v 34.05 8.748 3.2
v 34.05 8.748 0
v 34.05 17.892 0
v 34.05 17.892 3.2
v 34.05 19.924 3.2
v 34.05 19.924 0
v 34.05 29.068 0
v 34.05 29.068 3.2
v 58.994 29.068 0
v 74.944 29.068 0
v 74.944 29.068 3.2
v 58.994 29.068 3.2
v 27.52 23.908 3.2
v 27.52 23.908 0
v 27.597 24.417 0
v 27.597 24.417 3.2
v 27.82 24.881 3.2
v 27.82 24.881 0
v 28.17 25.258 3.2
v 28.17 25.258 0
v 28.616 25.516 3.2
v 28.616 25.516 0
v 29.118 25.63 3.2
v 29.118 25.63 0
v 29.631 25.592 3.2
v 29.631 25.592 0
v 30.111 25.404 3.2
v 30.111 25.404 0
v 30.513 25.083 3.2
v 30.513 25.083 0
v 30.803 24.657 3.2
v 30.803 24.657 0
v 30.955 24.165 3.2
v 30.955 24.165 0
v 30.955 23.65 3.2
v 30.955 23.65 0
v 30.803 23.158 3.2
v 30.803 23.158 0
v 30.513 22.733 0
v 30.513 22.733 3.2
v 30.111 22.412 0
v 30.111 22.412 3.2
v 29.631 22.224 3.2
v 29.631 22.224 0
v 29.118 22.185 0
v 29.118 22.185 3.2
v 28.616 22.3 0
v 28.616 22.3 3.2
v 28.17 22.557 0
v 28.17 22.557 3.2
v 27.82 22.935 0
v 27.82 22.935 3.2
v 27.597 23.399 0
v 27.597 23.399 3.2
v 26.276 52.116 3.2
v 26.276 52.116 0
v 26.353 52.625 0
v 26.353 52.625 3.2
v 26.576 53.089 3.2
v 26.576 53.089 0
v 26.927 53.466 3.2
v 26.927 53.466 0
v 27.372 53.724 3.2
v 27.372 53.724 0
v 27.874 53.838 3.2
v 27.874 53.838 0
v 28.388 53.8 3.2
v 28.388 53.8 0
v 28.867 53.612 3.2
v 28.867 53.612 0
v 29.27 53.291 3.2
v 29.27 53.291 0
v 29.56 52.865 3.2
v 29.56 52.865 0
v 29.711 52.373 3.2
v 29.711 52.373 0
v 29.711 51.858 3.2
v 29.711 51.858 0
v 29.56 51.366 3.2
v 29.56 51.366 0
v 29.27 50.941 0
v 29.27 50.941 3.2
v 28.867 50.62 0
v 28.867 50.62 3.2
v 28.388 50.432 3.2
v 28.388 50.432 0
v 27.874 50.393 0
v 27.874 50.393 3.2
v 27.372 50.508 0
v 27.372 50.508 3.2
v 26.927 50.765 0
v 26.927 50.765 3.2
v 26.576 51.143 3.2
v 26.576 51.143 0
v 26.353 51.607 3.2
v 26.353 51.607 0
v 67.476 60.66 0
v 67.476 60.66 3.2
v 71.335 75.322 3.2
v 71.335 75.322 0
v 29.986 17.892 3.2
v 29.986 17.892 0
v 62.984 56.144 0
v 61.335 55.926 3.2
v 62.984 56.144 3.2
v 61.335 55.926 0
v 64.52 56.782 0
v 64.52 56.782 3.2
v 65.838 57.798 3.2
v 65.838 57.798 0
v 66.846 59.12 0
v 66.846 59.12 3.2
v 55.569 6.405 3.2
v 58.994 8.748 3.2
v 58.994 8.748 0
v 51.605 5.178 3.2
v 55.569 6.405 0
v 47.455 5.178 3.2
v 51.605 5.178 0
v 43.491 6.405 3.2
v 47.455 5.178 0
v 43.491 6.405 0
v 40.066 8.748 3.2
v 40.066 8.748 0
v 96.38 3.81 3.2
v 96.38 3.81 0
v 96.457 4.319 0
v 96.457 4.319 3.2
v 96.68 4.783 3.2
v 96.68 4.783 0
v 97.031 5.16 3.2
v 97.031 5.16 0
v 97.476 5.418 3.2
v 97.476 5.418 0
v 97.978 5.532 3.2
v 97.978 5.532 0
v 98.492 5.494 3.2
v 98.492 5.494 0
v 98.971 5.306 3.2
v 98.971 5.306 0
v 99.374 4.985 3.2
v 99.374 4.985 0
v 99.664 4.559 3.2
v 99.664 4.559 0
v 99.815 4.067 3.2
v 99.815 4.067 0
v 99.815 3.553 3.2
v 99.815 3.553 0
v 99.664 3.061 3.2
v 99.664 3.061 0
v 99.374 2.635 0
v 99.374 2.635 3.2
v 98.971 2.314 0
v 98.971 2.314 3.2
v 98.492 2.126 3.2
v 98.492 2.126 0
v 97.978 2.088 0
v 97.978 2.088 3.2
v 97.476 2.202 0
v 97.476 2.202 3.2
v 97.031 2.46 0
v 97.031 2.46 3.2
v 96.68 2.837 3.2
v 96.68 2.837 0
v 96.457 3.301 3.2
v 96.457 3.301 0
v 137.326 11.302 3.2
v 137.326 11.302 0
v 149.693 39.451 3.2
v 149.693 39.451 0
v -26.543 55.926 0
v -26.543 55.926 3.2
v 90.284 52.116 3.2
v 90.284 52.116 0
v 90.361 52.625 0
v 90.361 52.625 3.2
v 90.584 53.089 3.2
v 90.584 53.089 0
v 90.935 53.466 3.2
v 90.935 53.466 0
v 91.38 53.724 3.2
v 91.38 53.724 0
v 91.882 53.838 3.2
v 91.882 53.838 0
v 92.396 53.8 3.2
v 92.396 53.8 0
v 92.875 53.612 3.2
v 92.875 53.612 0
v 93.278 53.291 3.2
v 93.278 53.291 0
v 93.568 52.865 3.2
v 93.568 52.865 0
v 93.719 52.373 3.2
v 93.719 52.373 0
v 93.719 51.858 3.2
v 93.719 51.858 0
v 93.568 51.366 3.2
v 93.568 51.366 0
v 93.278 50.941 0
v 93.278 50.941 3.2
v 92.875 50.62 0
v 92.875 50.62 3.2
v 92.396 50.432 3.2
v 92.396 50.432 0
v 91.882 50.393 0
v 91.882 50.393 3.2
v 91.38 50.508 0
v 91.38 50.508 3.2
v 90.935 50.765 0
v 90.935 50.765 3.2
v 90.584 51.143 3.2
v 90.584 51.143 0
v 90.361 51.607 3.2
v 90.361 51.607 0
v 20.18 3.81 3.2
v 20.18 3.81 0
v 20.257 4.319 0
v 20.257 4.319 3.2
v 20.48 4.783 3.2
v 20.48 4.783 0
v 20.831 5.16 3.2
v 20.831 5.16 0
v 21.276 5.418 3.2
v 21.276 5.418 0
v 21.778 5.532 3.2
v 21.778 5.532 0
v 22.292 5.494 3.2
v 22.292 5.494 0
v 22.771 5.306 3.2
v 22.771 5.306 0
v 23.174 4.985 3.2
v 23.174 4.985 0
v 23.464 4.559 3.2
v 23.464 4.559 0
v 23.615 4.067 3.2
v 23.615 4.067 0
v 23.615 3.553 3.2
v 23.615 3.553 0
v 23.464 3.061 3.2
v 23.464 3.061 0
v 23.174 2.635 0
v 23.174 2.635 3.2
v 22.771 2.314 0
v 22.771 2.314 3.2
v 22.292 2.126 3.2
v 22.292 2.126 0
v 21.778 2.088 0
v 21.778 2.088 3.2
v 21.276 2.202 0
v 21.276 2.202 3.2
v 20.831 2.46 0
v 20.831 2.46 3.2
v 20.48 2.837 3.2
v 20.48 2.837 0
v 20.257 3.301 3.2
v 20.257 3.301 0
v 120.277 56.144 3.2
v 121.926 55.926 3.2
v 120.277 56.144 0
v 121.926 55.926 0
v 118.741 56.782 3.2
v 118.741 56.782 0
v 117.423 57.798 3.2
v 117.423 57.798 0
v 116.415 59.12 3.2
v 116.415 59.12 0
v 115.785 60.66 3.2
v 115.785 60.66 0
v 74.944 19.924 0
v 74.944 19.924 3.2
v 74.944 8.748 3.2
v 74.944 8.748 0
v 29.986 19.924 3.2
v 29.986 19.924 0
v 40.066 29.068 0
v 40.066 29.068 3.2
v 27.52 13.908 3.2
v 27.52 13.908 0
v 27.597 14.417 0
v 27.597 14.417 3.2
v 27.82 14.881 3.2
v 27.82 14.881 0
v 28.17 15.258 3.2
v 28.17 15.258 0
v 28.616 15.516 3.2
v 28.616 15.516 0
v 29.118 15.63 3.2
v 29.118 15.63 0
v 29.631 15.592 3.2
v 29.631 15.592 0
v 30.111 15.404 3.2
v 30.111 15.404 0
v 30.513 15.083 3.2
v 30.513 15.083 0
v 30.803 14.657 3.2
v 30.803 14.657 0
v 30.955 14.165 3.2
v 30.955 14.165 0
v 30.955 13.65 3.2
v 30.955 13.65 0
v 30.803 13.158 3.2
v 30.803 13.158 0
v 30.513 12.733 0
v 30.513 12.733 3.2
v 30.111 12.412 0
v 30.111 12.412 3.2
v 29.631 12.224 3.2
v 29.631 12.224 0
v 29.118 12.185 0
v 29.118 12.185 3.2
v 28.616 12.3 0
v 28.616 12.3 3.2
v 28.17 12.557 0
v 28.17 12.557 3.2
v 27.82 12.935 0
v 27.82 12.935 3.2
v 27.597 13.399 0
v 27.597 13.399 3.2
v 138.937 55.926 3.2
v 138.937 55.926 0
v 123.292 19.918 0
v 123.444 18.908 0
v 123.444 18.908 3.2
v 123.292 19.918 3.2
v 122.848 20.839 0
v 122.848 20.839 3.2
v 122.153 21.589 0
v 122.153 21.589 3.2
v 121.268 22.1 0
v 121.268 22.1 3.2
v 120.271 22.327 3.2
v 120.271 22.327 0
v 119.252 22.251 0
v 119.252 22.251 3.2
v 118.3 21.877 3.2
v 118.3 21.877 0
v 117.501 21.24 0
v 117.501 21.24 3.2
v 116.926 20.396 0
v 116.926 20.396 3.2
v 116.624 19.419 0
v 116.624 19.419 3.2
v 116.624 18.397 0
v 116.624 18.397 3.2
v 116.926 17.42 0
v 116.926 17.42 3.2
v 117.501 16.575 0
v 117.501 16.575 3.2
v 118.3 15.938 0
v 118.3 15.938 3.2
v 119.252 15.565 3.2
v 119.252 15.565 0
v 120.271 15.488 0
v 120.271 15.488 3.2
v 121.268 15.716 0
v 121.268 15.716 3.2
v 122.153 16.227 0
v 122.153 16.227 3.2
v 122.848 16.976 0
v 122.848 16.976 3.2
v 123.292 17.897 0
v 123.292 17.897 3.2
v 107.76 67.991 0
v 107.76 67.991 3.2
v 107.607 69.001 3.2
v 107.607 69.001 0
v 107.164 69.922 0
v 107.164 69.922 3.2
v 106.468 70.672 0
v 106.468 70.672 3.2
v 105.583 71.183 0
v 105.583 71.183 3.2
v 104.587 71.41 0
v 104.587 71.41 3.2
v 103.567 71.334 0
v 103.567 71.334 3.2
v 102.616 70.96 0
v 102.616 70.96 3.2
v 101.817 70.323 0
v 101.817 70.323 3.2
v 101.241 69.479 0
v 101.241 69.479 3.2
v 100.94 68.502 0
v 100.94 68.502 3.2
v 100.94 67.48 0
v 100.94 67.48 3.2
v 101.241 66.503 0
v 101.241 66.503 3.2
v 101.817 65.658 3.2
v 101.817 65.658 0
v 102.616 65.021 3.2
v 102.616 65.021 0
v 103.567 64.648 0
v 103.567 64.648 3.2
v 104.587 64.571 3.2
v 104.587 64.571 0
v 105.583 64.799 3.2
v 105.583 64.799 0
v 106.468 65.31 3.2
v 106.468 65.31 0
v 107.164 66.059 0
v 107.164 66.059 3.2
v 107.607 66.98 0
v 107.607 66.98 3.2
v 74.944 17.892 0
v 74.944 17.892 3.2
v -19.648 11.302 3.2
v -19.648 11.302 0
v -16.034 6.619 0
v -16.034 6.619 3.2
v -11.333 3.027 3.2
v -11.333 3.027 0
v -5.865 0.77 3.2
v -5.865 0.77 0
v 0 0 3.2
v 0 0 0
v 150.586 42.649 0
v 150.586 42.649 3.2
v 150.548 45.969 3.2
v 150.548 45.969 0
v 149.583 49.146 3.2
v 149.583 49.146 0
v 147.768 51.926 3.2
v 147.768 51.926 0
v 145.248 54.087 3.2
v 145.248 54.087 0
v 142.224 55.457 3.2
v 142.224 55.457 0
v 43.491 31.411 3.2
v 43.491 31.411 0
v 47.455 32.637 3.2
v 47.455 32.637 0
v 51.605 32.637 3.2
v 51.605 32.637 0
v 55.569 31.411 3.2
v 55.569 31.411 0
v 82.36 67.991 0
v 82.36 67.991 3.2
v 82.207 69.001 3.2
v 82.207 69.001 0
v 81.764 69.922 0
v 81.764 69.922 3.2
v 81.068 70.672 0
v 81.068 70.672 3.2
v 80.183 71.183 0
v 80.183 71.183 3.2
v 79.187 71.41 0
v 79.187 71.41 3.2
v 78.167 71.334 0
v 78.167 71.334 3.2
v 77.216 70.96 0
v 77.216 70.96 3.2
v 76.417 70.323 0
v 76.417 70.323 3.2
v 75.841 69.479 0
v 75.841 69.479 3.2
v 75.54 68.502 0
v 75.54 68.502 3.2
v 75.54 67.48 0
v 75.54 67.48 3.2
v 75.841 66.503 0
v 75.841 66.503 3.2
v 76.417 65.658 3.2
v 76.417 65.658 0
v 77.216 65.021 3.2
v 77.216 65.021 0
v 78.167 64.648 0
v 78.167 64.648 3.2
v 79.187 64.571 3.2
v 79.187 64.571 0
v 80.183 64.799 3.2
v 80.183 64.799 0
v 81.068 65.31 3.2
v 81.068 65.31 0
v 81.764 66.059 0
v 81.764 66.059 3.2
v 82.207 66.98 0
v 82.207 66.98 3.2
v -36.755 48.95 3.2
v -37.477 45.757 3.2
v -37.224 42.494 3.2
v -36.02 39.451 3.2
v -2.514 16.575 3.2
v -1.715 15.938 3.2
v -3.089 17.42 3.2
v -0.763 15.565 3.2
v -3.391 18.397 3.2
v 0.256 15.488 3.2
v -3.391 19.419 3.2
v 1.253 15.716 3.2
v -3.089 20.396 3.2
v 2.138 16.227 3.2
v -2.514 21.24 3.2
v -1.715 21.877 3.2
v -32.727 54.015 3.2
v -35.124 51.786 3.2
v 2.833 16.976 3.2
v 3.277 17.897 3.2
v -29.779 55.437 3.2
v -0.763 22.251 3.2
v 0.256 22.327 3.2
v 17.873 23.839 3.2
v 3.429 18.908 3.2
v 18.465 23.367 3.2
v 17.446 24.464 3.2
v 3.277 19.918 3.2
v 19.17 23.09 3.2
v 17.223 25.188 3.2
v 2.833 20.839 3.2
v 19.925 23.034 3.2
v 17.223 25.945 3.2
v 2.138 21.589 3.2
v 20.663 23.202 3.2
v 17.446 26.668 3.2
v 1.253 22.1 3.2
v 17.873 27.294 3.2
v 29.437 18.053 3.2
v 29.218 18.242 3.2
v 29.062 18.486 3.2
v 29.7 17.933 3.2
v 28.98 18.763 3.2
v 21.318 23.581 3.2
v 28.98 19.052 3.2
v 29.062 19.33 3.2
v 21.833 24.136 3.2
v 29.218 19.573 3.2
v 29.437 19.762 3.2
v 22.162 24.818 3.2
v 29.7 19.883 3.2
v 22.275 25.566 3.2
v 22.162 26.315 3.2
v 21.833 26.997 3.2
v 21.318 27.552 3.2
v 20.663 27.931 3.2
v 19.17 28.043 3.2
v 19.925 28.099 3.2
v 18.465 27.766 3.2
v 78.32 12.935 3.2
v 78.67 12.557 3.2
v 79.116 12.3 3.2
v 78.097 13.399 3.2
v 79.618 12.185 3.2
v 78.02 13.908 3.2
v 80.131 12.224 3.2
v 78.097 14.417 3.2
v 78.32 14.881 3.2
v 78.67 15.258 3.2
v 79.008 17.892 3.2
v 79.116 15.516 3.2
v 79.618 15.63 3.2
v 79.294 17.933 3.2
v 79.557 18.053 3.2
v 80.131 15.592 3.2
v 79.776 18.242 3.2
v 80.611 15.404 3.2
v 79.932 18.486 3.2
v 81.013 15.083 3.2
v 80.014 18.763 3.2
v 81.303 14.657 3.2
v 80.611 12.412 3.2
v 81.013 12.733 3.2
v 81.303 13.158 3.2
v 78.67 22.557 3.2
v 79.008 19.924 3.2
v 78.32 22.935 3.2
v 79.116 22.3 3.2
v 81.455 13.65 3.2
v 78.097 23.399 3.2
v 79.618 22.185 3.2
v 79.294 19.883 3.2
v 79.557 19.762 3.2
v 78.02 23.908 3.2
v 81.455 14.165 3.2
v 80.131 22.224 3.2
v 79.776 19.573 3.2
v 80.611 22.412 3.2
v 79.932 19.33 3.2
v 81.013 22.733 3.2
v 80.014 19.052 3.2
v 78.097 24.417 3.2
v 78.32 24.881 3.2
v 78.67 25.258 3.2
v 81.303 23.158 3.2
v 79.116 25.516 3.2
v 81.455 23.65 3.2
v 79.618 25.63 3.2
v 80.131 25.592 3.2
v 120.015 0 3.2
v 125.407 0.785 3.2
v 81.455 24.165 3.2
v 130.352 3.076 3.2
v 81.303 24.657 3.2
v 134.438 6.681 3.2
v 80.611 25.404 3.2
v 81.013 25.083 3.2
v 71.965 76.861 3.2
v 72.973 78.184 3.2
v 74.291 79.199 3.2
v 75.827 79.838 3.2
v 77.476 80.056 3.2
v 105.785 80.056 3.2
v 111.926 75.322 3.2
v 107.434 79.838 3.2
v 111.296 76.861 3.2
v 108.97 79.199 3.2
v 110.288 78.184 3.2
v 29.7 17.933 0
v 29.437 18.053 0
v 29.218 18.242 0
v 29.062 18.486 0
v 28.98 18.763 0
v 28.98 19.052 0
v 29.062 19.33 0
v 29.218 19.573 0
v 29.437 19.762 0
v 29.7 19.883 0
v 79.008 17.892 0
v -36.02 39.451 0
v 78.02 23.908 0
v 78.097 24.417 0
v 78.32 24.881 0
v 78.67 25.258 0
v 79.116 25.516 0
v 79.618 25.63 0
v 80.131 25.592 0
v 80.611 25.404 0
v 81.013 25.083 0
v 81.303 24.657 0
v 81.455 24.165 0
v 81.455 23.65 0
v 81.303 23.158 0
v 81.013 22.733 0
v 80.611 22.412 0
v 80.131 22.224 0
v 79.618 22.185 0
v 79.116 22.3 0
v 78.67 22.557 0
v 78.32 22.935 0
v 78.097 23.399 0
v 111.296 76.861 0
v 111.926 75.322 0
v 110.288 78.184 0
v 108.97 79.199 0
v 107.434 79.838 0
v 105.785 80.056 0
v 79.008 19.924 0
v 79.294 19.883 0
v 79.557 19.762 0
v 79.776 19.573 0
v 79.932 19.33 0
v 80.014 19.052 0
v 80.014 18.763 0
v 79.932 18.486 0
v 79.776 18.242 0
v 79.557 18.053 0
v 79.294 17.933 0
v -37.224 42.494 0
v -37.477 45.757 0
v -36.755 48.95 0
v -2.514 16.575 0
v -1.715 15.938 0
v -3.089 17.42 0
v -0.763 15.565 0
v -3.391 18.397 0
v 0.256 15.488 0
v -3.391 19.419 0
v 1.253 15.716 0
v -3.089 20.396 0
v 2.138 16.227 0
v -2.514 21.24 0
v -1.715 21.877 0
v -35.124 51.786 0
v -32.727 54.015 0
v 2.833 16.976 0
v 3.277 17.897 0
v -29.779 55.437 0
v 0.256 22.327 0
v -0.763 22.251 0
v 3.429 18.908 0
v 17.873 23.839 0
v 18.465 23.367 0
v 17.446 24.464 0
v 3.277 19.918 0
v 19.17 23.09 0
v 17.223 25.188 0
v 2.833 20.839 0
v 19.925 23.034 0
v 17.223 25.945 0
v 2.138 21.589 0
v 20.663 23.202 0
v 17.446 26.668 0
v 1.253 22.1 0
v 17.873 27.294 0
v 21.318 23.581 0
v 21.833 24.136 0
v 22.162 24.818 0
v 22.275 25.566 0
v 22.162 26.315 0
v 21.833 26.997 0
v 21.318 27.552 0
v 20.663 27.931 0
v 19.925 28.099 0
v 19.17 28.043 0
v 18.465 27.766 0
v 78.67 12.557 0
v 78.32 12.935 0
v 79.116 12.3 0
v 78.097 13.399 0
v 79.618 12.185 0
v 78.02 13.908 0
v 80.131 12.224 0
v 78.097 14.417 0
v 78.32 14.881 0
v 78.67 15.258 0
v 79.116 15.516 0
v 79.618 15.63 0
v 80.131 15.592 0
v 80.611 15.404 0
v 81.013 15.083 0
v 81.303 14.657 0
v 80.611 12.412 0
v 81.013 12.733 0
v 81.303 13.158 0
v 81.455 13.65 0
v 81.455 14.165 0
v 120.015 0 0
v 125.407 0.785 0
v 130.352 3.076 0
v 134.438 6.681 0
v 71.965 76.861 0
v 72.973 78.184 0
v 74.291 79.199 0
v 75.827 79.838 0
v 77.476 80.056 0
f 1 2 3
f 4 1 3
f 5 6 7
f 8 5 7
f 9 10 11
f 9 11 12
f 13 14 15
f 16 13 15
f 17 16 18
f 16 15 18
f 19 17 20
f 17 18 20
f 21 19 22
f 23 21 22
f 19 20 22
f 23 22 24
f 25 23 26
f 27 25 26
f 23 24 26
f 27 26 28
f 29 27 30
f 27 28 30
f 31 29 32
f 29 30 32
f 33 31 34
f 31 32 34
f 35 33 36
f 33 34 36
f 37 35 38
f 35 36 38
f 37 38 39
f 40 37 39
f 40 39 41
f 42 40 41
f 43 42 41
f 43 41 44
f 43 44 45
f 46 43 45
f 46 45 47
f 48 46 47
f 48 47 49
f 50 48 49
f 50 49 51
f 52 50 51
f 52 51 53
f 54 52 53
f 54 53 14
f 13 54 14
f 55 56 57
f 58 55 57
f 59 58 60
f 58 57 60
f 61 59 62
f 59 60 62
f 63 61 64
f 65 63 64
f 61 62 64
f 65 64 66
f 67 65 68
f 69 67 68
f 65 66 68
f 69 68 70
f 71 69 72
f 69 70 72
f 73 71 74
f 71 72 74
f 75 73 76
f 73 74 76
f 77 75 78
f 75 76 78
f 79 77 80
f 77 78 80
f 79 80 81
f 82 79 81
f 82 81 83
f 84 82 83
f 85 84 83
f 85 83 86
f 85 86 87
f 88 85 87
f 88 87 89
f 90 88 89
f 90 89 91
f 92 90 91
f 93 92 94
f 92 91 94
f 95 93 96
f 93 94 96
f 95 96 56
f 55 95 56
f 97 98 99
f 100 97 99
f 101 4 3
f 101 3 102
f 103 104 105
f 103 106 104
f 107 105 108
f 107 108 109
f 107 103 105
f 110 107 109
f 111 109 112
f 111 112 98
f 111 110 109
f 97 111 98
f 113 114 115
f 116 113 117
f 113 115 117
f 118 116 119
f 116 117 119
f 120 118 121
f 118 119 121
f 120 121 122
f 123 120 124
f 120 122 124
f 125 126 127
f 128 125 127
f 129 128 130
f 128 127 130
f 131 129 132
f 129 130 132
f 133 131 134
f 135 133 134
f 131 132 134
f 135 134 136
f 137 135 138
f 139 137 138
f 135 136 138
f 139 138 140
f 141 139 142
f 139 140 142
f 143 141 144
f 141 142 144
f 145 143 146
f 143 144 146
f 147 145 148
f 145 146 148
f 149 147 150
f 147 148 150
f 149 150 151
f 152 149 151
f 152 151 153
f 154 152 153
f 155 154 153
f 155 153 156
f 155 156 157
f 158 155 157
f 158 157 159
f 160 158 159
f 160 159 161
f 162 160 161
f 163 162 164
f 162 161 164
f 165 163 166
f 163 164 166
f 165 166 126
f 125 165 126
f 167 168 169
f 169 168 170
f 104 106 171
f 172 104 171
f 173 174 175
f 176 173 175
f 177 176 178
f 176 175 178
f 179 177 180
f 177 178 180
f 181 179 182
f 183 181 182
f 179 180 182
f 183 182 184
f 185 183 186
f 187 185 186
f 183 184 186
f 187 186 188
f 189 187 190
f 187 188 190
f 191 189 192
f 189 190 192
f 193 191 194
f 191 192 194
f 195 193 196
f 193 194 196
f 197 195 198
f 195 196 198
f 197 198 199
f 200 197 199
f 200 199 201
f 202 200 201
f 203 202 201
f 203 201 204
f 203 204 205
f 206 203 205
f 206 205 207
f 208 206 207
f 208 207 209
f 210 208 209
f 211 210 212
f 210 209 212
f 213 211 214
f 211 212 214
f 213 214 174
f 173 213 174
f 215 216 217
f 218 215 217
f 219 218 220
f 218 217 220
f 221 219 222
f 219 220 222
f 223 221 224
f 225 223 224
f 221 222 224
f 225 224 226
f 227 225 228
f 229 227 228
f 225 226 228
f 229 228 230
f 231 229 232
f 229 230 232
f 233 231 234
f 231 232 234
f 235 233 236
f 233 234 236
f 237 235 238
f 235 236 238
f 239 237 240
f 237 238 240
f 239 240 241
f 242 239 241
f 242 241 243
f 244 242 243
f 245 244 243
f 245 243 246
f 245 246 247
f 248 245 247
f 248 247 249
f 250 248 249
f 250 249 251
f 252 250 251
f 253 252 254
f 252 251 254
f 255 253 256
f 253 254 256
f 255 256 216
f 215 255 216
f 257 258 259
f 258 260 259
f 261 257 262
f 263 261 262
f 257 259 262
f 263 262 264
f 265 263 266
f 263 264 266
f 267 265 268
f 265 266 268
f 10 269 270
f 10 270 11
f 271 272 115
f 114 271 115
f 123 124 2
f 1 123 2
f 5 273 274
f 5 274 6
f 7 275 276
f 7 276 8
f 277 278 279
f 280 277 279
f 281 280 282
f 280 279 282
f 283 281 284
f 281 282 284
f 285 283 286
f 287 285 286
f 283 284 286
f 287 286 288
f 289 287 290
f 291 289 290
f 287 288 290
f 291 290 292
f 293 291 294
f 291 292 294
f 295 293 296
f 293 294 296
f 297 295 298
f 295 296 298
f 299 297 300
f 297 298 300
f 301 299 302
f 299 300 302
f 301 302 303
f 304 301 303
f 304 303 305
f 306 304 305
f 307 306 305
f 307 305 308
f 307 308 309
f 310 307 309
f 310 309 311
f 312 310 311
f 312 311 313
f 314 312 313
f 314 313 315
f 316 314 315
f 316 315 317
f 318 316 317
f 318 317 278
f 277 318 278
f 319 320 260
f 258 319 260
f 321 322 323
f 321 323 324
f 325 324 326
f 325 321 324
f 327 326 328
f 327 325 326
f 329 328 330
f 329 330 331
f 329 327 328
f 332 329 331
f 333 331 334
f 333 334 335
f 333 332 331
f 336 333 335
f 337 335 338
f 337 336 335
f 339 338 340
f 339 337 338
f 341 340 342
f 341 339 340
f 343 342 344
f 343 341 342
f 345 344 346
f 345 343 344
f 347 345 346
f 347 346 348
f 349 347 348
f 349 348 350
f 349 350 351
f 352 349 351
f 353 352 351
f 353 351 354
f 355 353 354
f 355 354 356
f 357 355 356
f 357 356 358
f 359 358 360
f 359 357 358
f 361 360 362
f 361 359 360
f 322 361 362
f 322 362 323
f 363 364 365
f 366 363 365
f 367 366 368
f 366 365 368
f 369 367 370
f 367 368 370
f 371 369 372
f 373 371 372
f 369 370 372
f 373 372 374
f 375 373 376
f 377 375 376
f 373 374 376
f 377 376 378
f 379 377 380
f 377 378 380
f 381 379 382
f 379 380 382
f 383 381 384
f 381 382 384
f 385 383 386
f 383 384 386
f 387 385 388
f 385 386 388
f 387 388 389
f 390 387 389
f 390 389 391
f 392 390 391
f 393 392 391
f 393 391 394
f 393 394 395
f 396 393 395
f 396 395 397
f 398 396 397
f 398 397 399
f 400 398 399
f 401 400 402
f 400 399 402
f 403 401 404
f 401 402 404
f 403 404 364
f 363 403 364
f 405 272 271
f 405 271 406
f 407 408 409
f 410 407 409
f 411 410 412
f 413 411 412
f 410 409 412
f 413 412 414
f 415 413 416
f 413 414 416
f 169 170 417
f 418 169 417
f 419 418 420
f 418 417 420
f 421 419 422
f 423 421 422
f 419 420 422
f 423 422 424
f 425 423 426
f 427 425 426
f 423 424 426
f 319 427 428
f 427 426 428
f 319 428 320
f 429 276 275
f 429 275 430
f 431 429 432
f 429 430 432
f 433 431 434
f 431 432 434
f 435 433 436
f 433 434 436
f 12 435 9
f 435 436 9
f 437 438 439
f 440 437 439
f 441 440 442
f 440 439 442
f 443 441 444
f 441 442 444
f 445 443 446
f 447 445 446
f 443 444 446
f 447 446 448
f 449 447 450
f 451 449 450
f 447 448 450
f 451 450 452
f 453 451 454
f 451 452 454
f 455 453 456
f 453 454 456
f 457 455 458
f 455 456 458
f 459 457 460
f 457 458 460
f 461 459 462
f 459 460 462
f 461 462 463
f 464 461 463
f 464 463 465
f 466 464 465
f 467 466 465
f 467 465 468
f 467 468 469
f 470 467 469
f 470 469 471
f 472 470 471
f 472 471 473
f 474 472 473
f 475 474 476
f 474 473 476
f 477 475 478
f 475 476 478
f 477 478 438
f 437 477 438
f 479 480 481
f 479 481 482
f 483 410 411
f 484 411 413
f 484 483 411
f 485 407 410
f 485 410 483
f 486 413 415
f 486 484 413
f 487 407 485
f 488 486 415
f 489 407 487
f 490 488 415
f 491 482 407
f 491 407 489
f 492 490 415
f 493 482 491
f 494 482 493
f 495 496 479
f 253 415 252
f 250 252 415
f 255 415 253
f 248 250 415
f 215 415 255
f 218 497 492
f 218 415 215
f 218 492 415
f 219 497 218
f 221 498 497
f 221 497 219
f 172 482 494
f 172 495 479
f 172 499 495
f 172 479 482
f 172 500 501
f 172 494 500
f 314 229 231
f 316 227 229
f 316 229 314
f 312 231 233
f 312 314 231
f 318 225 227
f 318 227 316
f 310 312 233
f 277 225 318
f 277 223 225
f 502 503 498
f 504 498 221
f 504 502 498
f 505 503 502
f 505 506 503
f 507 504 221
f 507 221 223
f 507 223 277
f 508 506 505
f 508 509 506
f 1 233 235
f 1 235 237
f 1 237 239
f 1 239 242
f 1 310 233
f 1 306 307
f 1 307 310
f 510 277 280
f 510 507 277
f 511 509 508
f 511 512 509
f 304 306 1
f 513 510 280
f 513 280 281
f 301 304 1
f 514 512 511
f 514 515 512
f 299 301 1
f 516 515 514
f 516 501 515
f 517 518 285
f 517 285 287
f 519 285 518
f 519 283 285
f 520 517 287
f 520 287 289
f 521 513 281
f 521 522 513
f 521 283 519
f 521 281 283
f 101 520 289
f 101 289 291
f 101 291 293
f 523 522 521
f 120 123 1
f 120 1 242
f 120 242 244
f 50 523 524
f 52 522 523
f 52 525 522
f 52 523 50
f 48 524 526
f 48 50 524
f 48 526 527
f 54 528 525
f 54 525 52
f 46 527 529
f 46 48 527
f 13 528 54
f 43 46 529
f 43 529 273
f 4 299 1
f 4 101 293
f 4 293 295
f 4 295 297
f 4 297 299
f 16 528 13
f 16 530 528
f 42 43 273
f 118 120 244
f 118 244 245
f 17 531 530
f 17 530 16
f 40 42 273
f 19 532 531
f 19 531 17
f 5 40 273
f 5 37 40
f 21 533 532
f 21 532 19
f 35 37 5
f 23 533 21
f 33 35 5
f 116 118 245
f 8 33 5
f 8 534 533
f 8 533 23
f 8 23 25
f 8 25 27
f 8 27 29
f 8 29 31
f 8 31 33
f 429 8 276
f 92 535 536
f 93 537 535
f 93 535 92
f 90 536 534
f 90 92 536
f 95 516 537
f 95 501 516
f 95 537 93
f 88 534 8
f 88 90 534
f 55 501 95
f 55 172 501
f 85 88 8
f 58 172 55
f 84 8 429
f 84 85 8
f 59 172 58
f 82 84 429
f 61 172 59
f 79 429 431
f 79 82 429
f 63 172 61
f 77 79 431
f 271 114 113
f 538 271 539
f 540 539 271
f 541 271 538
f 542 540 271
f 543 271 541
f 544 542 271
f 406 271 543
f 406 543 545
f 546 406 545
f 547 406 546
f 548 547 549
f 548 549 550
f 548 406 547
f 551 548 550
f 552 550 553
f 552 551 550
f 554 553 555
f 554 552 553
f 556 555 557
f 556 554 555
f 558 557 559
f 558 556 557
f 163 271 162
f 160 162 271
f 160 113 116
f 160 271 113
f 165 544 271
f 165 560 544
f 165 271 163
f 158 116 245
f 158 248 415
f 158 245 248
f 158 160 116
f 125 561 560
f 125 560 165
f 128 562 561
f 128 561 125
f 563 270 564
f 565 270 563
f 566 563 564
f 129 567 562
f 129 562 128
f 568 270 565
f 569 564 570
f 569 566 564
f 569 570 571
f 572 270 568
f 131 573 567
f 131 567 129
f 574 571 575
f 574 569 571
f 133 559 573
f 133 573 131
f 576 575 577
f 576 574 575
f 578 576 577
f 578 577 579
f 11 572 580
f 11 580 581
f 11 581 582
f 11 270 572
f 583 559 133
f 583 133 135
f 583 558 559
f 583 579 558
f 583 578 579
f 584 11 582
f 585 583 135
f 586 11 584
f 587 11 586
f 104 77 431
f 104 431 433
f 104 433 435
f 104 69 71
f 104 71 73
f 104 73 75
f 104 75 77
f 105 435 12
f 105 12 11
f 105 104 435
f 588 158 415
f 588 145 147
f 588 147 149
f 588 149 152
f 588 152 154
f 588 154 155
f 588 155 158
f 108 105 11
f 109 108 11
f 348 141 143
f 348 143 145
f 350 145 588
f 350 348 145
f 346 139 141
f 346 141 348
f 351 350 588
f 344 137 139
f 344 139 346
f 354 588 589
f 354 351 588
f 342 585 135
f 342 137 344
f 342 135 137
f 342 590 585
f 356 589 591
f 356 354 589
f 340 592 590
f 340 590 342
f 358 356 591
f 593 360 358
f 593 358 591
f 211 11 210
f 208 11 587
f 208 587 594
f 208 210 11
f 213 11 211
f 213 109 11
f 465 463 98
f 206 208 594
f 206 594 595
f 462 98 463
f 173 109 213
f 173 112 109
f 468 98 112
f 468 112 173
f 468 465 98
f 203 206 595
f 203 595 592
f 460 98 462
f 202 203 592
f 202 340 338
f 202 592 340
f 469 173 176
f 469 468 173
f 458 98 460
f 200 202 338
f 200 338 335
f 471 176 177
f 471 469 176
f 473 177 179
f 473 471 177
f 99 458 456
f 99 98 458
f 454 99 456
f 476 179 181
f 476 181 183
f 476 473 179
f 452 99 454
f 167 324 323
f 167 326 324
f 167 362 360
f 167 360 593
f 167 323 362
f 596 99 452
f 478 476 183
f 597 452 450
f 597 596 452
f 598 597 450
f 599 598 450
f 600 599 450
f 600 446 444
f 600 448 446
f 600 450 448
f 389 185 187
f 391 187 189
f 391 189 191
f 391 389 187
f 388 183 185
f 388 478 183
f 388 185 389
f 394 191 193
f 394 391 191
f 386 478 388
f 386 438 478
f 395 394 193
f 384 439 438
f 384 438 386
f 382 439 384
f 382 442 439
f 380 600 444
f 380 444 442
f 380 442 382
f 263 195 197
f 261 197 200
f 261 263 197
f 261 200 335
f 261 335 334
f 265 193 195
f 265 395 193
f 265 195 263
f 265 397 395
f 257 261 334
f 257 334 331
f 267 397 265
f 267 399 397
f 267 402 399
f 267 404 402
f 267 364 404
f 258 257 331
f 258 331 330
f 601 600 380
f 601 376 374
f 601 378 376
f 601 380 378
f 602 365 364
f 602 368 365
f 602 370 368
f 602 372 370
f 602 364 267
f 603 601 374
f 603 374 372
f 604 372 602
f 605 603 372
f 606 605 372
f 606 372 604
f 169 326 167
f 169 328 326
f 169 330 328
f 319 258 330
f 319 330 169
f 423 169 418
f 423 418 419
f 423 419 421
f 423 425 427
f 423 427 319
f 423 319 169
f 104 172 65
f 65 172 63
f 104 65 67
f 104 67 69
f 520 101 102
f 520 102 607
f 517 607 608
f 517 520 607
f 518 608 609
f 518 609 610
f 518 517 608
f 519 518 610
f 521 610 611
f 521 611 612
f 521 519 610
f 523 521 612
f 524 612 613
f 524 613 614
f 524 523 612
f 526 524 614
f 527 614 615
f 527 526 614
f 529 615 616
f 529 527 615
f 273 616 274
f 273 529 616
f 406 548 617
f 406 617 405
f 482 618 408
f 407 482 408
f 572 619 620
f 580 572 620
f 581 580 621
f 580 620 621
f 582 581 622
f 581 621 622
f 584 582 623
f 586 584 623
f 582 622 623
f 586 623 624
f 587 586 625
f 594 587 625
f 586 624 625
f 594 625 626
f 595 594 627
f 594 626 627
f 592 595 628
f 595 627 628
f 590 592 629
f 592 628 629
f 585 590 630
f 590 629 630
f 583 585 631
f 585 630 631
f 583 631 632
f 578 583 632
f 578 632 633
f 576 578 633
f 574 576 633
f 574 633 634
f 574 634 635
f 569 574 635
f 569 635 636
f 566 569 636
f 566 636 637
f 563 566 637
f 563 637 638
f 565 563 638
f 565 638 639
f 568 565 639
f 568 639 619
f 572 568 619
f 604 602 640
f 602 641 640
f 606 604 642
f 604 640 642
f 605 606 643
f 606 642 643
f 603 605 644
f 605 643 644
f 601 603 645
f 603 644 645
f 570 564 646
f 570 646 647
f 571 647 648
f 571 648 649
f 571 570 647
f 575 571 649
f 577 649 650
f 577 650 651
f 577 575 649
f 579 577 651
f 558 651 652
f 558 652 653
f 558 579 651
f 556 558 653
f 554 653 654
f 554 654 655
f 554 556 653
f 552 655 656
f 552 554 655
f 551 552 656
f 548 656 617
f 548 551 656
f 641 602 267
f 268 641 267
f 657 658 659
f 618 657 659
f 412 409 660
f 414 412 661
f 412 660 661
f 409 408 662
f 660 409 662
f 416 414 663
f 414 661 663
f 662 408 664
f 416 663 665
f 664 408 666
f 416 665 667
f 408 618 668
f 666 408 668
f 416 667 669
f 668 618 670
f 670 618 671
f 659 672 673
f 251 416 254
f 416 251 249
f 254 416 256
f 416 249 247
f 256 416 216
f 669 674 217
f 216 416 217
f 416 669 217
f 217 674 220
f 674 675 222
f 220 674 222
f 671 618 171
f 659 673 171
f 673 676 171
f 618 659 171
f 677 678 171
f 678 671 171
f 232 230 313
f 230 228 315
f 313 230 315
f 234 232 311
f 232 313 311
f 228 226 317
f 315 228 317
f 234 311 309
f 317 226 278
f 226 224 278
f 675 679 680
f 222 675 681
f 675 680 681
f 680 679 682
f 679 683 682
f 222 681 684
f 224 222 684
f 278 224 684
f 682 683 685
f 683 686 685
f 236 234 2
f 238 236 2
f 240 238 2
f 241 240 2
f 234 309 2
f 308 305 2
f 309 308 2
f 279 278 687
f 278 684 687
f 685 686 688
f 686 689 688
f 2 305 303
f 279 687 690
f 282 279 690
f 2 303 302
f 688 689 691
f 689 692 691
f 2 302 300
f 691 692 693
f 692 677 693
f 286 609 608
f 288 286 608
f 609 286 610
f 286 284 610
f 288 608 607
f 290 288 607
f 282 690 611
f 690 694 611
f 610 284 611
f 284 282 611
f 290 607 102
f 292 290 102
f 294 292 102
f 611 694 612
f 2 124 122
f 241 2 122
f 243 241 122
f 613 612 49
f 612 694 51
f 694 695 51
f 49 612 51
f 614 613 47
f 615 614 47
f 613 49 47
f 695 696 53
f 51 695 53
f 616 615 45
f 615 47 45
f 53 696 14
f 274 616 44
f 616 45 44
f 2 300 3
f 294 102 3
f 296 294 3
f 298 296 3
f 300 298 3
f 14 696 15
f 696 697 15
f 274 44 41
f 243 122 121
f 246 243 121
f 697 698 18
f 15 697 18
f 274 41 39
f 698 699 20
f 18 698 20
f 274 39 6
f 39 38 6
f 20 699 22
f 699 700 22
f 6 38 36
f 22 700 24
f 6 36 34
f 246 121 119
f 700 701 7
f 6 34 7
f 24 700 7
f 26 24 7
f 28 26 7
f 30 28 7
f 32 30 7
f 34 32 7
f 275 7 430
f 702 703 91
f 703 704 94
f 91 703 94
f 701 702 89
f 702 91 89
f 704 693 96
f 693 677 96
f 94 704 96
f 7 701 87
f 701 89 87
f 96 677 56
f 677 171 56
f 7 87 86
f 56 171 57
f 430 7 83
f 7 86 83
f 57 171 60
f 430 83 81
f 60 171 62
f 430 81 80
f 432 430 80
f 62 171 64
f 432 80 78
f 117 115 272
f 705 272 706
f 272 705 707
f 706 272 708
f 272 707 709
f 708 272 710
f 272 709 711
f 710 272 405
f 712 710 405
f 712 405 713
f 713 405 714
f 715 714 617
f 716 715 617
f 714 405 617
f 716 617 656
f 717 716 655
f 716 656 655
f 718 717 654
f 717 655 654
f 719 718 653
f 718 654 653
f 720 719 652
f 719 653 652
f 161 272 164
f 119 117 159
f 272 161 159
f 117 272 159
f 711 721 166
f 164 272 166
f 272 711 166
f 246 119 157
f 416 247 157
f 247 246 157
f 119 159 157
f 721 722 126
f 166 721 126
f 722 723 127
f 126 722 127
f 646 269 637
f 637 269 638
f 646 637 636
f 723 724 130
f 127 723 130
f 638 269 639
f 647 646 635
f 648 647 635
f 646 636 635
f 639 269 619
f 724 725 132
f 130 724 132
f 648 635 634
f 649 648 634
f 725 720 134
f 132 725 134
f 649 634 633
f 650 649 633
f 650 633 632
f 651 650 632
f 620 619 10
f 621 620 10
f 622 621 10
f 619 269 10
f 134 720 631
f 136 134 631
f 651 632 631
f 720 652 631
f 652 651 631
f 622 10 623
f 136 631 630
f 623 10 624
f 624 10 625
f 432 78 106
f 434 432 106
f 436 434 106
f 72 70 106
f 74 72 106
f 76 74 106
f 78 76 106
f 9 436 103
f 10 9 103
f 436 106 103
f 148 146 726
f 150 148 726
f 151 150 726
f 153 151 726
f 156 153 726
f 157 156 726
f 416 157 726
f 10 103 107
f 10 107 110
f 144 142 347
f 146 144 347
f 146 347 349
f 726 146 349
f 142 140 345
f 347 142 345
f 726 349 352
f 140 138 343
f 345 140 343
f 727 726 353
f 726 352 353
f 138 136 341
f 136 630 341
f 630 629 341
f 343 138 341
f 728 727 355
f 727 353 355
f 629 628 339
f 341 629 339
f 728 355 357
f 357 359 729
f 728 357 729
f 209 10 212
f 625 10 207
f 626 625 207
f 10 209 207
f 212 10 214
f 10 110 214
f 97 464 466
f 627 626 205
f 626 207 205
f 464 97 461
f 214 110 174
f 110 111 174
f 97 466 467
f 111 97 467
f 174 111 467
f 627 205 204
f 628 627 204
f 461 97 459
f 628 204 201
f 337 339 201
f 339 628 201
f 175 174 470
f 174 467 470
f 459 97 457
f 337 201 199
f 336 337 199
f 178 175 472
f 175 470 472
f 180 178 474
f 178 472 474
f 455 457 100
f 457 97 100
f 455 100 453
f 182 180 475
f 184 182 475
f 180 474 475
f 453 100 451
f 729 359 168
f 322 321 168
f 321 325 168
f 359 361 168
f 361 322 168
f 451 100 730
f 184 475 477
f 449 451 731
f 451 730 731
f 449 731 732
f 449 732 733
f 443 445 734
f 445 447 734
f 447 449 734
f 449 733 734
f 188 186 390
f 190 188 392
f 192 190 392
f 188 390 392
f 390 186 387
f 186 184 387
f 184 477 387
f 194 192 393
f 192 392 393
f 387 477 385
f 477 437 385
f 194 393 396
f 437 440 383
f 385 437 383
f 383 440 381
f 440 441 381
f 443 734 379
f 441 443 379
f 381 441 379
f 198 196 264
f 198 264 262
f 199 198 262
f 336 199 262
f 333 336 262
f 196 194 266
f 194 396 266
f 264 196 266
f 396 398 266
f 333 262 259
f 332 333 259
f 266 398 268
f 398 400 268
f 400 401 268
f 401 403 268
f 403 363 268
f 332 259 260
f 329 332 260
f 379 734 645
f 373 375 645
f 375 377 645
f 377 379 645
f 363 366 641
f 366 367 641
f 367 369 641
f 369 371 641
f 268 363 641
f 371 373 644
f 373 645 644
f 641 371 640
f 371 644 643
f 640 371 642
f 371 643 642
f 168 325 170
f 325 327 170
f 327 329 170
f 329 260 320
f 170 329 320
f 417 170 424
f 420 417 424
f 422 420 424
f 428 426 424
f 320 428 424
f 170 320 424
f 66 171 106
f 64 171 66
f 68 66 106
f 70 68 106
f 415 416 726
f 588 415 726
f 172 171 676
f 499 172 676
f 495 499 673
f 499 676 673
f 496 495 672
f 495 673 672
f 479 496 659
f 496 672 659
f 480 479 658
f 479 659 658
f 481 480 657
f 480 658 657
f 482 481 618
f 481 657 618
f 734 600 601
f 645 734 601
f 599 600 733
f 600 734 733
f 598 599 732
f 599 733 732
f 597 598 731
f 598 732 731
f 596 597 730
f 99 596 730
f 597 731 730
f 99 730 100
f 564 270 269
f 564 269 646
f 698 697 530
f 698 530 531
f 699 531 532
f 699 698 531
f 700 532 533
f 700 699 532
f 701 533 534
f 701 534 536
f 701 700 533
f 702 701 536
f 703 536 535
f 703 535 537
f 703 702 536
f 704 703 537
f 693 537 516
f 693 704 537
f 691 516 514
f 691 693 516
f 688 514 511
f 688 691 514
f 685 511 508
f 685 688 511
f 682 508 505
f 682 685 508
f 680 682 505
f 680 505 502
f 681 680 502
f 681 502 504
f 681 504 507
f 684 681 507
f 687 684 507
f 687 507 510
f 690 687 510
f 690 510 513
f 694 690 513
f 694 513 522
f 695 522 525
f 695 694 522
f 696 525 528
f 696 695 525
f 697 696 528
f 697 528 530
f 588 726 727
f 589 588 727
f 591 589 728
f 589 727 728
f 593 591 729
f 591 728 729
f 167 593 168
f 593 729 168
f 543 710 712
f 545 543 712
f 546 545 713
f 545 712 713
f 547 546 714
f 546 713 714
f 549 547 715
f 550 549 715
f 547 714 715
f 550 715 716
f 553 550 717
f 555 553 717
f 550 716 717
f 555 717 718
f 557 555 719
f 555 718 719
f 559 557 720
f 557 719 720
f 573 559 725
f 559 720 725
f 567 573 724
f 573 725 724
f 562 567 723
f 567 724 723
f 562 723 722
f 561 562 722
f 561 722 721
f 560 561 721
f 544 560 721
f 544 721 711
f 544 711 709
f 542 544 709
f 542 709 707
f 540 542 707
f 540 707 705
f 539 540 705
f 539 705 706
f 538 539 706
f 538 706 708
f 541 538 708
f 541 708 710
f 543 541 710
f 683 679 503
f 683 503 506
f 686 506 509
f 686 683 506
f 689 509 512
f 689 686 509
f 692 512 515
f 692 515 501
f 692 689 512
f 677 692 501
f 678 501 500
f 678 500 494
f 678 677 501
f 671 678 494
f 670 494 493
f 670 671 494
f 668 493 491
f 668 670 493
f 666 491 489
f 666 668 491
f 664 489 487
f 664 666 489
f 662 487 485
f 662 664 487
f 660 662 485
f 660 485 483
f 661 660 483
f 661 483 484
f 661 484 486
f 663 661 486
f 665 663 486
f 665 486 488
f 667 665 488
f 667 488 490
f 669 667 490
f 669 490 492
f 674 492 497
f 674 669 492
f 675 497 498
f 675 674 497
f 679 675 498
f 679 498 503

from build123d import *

# Parameters (mm, degrees)
SKETCH1_R           = 3.429
SKETCH1_R_2         = 2.54
BOSS_EXTRUDE1_DEPTH = 3.2004
SKETCH2_R           = 1.7272
CUT_EXTRUDE1_DEPTH  = 3.2004
SKETCH5_R           = 1.7272
SKETCH5_W           = 40.894
SKETCH5_H           = 20.32
CUT_EXTRUDE3_DEPTH  = 4.2004
CUT_EXTRUDE4_DEPTH  = 3.2004
SKETCH9_R           = 13.885201093
CUT_EXTRUDE7_DEPTH  = 3.2004
SKETCH10_R          = 3.429
BOSS_EXTRUDE2_DEPTH = 3.2004
FILLET1_R           = 6.35


with BuildPart() as part:
    # Sketch1 → Boss-Extrude1 (new body)
    with BuildSketch(Plane.XY):
        with BuildLine():
            Line((0, 0), (120.015, 0))
            ThreePointArc((120.015, 0), (130.351788397, 3.075697789), (137.325636158, 11.302152593))
            Line((137.325636158, 11.302152593), (149.69326877, 39.451329485))
            ThreePointArc((149.69326877, 39.451329485), (148.774539583, 50.600046625), (138.937102863, 55.925719911))
            Line((138.937102863, 55.925719911), (-26.54325766, 55.925719911))
            ThreePointArc((-26.54325766, 55.925719911), (-36.046025914, 50.429200208), (-36.019801229, 39.451329485))
            Line((-36.019801229, 39.451329485), (-19.648099871, 11.302152593))
            ThreePointArc((-19.648099871, 11.302152593), (-11.333429333, 3.027112684), (0, 0))
        make_face()
        with Locations((120.015, 18.90776)):
            Circle(SKETCH1_R, mode=Mode.SUBTRACT)
        with Locations((0, 18.90776)):
            Circle(SKETCH1_R, mode=Mode.SUBTRACT)
        with Locations((19.734727626, 25.566426992)):
            Circle(SKETCH1_R_2, mode=Mode.SUBTRACT)
    extrude(amount=BOSS_EXTRUDE1_DEPTH)

    # Sketch2 → Cut-Extrude1 (cut)
    with BuildSketch(Plane(origin=(0, 0, 0), x_dir=(-1, 0, 0), z_dir=(0, 0, -1))):
        with Locations((-92.0115, 52.115719911)):
            Circle(SKETCH2_R)
        with Locations((-28.0035, 52.115719911)):
            Circle(SKETCH2_R)
        with Locations((-98.1075, 3.81)):
            Circle(SKETCH2_R)
        with Locations((-21.9075, 3.81)):
            Circle(SKETCH2_R)
    extrude(amount=-CUT_EXTRUDE1_DEPTH, mode=Mode.SUBTRACT)

    # Sketch5 → Cut-Extrude3 (cut, through all)
    with BuildSketch(Plane(origin=(0, 0, 0), x_dir=(-1, 0, 0), z_dir=(0, 0, -1))):
        with Locations((-79.746999972, 23.90776)):
            Circle(SKETCH5_R)
        with Locations((-29.246999972, 13.90776)):
            Circle(SKETCH5_R)
        with Locations((-29.246999972, 23.90776)):
            Circle(SKETCH5_R)
        with Locations((-79.746999972, 13.90776)):
            Circle(SKETCH5_R)
        with Locations((-54.496999972, 18.90776)):
            Rectangle(SKETCH5_W, SKETCH5_H)
    extrude(amount=-CUT_EXTRUDE3_DEPTH, mode=Mode.SUBTRACT)

    # Sketch6 → Cut-Extrude4 (cut)
    with BuildSketch(Plane.XY.offset(3.2004)):
        with BuildLine():
            Line((29.985999972, 19.92376), (34.049999972, 19.92376))
            Line((34.049999972, 19.92376), (34.049999972, 17.89176))
            Line((34.049999972, 17.89176), (29.985999972, 17.89176))
            ThreePointArc((29.985999972, 17.89176), (28.969999972, 18.90776), (29.985999972, 19.92376))
        make_face()
        with BuildLine():
            Line((74.943999972, 19.92376), (79.007999972, 19.92376))
            ThreePointArc((79.007999972, 19.92376), (80.023999972, 18.90776), (79.007999972, 17.89176))
            Line((79.007999972, 17.89176), (74.943999972, 17.89176))
            Line((74.943999972, 17.89176), (74.943999972, 19.92376))
        make_face()
    extrude(amount=-CUT_EXTRUDE4_DEPTH, mode=Mode.SUBTRACT)

    # Sketch9 → Cut-Extrude7 (cut)
    with BuildSketch(Plane(origin=(0, 0, 0), x_dir=(-1, 0, 0), z_dir=(0, 0, -1))):
        with Locations((-49.53, 18.90776)):
            Circle(SKETCH9_R)
    extrude(amount=-CUT_EXTRUDE7_DEPTH, mode=Mode.SUBTRACT)

    # Sketch10 → Boss-Extrude2 (add)
    with BuildSketch(Plane.XY.offset(3.2004)):
        Polygon((72.5805, 80.055719911), (110.6805, 80.055719911), (117.0305, 55.925719911), (66.2305, 55.925719911), align=None)
        with Locations((78.9305, 67.990719911)):
            Circle(SKETCH10_R, mode=Mode.SUBTRACT)
        with Locations((104.3305, 67.990719911)):
            Circle(SKETCH10_R, mode=Mode.SUBTRACT)
    extrude(amount=-BOSS_EXTRUDE2_DEPTH)

    # Fillet1
    fillet1_edges = [part.edges().sort_by_distance(p)[0] for p in [
        (117.0305, 55.925719911, 1.6002),
        (110.6805, 80.055719911, 1.6002),
        (72.5805, 80.055719911, 1.6002),
        (66.2305, 55.925719911, 1.6002),
    ]]
    fillet(fillet1_edges, radius=FILLET1_R)


solid = part.part
